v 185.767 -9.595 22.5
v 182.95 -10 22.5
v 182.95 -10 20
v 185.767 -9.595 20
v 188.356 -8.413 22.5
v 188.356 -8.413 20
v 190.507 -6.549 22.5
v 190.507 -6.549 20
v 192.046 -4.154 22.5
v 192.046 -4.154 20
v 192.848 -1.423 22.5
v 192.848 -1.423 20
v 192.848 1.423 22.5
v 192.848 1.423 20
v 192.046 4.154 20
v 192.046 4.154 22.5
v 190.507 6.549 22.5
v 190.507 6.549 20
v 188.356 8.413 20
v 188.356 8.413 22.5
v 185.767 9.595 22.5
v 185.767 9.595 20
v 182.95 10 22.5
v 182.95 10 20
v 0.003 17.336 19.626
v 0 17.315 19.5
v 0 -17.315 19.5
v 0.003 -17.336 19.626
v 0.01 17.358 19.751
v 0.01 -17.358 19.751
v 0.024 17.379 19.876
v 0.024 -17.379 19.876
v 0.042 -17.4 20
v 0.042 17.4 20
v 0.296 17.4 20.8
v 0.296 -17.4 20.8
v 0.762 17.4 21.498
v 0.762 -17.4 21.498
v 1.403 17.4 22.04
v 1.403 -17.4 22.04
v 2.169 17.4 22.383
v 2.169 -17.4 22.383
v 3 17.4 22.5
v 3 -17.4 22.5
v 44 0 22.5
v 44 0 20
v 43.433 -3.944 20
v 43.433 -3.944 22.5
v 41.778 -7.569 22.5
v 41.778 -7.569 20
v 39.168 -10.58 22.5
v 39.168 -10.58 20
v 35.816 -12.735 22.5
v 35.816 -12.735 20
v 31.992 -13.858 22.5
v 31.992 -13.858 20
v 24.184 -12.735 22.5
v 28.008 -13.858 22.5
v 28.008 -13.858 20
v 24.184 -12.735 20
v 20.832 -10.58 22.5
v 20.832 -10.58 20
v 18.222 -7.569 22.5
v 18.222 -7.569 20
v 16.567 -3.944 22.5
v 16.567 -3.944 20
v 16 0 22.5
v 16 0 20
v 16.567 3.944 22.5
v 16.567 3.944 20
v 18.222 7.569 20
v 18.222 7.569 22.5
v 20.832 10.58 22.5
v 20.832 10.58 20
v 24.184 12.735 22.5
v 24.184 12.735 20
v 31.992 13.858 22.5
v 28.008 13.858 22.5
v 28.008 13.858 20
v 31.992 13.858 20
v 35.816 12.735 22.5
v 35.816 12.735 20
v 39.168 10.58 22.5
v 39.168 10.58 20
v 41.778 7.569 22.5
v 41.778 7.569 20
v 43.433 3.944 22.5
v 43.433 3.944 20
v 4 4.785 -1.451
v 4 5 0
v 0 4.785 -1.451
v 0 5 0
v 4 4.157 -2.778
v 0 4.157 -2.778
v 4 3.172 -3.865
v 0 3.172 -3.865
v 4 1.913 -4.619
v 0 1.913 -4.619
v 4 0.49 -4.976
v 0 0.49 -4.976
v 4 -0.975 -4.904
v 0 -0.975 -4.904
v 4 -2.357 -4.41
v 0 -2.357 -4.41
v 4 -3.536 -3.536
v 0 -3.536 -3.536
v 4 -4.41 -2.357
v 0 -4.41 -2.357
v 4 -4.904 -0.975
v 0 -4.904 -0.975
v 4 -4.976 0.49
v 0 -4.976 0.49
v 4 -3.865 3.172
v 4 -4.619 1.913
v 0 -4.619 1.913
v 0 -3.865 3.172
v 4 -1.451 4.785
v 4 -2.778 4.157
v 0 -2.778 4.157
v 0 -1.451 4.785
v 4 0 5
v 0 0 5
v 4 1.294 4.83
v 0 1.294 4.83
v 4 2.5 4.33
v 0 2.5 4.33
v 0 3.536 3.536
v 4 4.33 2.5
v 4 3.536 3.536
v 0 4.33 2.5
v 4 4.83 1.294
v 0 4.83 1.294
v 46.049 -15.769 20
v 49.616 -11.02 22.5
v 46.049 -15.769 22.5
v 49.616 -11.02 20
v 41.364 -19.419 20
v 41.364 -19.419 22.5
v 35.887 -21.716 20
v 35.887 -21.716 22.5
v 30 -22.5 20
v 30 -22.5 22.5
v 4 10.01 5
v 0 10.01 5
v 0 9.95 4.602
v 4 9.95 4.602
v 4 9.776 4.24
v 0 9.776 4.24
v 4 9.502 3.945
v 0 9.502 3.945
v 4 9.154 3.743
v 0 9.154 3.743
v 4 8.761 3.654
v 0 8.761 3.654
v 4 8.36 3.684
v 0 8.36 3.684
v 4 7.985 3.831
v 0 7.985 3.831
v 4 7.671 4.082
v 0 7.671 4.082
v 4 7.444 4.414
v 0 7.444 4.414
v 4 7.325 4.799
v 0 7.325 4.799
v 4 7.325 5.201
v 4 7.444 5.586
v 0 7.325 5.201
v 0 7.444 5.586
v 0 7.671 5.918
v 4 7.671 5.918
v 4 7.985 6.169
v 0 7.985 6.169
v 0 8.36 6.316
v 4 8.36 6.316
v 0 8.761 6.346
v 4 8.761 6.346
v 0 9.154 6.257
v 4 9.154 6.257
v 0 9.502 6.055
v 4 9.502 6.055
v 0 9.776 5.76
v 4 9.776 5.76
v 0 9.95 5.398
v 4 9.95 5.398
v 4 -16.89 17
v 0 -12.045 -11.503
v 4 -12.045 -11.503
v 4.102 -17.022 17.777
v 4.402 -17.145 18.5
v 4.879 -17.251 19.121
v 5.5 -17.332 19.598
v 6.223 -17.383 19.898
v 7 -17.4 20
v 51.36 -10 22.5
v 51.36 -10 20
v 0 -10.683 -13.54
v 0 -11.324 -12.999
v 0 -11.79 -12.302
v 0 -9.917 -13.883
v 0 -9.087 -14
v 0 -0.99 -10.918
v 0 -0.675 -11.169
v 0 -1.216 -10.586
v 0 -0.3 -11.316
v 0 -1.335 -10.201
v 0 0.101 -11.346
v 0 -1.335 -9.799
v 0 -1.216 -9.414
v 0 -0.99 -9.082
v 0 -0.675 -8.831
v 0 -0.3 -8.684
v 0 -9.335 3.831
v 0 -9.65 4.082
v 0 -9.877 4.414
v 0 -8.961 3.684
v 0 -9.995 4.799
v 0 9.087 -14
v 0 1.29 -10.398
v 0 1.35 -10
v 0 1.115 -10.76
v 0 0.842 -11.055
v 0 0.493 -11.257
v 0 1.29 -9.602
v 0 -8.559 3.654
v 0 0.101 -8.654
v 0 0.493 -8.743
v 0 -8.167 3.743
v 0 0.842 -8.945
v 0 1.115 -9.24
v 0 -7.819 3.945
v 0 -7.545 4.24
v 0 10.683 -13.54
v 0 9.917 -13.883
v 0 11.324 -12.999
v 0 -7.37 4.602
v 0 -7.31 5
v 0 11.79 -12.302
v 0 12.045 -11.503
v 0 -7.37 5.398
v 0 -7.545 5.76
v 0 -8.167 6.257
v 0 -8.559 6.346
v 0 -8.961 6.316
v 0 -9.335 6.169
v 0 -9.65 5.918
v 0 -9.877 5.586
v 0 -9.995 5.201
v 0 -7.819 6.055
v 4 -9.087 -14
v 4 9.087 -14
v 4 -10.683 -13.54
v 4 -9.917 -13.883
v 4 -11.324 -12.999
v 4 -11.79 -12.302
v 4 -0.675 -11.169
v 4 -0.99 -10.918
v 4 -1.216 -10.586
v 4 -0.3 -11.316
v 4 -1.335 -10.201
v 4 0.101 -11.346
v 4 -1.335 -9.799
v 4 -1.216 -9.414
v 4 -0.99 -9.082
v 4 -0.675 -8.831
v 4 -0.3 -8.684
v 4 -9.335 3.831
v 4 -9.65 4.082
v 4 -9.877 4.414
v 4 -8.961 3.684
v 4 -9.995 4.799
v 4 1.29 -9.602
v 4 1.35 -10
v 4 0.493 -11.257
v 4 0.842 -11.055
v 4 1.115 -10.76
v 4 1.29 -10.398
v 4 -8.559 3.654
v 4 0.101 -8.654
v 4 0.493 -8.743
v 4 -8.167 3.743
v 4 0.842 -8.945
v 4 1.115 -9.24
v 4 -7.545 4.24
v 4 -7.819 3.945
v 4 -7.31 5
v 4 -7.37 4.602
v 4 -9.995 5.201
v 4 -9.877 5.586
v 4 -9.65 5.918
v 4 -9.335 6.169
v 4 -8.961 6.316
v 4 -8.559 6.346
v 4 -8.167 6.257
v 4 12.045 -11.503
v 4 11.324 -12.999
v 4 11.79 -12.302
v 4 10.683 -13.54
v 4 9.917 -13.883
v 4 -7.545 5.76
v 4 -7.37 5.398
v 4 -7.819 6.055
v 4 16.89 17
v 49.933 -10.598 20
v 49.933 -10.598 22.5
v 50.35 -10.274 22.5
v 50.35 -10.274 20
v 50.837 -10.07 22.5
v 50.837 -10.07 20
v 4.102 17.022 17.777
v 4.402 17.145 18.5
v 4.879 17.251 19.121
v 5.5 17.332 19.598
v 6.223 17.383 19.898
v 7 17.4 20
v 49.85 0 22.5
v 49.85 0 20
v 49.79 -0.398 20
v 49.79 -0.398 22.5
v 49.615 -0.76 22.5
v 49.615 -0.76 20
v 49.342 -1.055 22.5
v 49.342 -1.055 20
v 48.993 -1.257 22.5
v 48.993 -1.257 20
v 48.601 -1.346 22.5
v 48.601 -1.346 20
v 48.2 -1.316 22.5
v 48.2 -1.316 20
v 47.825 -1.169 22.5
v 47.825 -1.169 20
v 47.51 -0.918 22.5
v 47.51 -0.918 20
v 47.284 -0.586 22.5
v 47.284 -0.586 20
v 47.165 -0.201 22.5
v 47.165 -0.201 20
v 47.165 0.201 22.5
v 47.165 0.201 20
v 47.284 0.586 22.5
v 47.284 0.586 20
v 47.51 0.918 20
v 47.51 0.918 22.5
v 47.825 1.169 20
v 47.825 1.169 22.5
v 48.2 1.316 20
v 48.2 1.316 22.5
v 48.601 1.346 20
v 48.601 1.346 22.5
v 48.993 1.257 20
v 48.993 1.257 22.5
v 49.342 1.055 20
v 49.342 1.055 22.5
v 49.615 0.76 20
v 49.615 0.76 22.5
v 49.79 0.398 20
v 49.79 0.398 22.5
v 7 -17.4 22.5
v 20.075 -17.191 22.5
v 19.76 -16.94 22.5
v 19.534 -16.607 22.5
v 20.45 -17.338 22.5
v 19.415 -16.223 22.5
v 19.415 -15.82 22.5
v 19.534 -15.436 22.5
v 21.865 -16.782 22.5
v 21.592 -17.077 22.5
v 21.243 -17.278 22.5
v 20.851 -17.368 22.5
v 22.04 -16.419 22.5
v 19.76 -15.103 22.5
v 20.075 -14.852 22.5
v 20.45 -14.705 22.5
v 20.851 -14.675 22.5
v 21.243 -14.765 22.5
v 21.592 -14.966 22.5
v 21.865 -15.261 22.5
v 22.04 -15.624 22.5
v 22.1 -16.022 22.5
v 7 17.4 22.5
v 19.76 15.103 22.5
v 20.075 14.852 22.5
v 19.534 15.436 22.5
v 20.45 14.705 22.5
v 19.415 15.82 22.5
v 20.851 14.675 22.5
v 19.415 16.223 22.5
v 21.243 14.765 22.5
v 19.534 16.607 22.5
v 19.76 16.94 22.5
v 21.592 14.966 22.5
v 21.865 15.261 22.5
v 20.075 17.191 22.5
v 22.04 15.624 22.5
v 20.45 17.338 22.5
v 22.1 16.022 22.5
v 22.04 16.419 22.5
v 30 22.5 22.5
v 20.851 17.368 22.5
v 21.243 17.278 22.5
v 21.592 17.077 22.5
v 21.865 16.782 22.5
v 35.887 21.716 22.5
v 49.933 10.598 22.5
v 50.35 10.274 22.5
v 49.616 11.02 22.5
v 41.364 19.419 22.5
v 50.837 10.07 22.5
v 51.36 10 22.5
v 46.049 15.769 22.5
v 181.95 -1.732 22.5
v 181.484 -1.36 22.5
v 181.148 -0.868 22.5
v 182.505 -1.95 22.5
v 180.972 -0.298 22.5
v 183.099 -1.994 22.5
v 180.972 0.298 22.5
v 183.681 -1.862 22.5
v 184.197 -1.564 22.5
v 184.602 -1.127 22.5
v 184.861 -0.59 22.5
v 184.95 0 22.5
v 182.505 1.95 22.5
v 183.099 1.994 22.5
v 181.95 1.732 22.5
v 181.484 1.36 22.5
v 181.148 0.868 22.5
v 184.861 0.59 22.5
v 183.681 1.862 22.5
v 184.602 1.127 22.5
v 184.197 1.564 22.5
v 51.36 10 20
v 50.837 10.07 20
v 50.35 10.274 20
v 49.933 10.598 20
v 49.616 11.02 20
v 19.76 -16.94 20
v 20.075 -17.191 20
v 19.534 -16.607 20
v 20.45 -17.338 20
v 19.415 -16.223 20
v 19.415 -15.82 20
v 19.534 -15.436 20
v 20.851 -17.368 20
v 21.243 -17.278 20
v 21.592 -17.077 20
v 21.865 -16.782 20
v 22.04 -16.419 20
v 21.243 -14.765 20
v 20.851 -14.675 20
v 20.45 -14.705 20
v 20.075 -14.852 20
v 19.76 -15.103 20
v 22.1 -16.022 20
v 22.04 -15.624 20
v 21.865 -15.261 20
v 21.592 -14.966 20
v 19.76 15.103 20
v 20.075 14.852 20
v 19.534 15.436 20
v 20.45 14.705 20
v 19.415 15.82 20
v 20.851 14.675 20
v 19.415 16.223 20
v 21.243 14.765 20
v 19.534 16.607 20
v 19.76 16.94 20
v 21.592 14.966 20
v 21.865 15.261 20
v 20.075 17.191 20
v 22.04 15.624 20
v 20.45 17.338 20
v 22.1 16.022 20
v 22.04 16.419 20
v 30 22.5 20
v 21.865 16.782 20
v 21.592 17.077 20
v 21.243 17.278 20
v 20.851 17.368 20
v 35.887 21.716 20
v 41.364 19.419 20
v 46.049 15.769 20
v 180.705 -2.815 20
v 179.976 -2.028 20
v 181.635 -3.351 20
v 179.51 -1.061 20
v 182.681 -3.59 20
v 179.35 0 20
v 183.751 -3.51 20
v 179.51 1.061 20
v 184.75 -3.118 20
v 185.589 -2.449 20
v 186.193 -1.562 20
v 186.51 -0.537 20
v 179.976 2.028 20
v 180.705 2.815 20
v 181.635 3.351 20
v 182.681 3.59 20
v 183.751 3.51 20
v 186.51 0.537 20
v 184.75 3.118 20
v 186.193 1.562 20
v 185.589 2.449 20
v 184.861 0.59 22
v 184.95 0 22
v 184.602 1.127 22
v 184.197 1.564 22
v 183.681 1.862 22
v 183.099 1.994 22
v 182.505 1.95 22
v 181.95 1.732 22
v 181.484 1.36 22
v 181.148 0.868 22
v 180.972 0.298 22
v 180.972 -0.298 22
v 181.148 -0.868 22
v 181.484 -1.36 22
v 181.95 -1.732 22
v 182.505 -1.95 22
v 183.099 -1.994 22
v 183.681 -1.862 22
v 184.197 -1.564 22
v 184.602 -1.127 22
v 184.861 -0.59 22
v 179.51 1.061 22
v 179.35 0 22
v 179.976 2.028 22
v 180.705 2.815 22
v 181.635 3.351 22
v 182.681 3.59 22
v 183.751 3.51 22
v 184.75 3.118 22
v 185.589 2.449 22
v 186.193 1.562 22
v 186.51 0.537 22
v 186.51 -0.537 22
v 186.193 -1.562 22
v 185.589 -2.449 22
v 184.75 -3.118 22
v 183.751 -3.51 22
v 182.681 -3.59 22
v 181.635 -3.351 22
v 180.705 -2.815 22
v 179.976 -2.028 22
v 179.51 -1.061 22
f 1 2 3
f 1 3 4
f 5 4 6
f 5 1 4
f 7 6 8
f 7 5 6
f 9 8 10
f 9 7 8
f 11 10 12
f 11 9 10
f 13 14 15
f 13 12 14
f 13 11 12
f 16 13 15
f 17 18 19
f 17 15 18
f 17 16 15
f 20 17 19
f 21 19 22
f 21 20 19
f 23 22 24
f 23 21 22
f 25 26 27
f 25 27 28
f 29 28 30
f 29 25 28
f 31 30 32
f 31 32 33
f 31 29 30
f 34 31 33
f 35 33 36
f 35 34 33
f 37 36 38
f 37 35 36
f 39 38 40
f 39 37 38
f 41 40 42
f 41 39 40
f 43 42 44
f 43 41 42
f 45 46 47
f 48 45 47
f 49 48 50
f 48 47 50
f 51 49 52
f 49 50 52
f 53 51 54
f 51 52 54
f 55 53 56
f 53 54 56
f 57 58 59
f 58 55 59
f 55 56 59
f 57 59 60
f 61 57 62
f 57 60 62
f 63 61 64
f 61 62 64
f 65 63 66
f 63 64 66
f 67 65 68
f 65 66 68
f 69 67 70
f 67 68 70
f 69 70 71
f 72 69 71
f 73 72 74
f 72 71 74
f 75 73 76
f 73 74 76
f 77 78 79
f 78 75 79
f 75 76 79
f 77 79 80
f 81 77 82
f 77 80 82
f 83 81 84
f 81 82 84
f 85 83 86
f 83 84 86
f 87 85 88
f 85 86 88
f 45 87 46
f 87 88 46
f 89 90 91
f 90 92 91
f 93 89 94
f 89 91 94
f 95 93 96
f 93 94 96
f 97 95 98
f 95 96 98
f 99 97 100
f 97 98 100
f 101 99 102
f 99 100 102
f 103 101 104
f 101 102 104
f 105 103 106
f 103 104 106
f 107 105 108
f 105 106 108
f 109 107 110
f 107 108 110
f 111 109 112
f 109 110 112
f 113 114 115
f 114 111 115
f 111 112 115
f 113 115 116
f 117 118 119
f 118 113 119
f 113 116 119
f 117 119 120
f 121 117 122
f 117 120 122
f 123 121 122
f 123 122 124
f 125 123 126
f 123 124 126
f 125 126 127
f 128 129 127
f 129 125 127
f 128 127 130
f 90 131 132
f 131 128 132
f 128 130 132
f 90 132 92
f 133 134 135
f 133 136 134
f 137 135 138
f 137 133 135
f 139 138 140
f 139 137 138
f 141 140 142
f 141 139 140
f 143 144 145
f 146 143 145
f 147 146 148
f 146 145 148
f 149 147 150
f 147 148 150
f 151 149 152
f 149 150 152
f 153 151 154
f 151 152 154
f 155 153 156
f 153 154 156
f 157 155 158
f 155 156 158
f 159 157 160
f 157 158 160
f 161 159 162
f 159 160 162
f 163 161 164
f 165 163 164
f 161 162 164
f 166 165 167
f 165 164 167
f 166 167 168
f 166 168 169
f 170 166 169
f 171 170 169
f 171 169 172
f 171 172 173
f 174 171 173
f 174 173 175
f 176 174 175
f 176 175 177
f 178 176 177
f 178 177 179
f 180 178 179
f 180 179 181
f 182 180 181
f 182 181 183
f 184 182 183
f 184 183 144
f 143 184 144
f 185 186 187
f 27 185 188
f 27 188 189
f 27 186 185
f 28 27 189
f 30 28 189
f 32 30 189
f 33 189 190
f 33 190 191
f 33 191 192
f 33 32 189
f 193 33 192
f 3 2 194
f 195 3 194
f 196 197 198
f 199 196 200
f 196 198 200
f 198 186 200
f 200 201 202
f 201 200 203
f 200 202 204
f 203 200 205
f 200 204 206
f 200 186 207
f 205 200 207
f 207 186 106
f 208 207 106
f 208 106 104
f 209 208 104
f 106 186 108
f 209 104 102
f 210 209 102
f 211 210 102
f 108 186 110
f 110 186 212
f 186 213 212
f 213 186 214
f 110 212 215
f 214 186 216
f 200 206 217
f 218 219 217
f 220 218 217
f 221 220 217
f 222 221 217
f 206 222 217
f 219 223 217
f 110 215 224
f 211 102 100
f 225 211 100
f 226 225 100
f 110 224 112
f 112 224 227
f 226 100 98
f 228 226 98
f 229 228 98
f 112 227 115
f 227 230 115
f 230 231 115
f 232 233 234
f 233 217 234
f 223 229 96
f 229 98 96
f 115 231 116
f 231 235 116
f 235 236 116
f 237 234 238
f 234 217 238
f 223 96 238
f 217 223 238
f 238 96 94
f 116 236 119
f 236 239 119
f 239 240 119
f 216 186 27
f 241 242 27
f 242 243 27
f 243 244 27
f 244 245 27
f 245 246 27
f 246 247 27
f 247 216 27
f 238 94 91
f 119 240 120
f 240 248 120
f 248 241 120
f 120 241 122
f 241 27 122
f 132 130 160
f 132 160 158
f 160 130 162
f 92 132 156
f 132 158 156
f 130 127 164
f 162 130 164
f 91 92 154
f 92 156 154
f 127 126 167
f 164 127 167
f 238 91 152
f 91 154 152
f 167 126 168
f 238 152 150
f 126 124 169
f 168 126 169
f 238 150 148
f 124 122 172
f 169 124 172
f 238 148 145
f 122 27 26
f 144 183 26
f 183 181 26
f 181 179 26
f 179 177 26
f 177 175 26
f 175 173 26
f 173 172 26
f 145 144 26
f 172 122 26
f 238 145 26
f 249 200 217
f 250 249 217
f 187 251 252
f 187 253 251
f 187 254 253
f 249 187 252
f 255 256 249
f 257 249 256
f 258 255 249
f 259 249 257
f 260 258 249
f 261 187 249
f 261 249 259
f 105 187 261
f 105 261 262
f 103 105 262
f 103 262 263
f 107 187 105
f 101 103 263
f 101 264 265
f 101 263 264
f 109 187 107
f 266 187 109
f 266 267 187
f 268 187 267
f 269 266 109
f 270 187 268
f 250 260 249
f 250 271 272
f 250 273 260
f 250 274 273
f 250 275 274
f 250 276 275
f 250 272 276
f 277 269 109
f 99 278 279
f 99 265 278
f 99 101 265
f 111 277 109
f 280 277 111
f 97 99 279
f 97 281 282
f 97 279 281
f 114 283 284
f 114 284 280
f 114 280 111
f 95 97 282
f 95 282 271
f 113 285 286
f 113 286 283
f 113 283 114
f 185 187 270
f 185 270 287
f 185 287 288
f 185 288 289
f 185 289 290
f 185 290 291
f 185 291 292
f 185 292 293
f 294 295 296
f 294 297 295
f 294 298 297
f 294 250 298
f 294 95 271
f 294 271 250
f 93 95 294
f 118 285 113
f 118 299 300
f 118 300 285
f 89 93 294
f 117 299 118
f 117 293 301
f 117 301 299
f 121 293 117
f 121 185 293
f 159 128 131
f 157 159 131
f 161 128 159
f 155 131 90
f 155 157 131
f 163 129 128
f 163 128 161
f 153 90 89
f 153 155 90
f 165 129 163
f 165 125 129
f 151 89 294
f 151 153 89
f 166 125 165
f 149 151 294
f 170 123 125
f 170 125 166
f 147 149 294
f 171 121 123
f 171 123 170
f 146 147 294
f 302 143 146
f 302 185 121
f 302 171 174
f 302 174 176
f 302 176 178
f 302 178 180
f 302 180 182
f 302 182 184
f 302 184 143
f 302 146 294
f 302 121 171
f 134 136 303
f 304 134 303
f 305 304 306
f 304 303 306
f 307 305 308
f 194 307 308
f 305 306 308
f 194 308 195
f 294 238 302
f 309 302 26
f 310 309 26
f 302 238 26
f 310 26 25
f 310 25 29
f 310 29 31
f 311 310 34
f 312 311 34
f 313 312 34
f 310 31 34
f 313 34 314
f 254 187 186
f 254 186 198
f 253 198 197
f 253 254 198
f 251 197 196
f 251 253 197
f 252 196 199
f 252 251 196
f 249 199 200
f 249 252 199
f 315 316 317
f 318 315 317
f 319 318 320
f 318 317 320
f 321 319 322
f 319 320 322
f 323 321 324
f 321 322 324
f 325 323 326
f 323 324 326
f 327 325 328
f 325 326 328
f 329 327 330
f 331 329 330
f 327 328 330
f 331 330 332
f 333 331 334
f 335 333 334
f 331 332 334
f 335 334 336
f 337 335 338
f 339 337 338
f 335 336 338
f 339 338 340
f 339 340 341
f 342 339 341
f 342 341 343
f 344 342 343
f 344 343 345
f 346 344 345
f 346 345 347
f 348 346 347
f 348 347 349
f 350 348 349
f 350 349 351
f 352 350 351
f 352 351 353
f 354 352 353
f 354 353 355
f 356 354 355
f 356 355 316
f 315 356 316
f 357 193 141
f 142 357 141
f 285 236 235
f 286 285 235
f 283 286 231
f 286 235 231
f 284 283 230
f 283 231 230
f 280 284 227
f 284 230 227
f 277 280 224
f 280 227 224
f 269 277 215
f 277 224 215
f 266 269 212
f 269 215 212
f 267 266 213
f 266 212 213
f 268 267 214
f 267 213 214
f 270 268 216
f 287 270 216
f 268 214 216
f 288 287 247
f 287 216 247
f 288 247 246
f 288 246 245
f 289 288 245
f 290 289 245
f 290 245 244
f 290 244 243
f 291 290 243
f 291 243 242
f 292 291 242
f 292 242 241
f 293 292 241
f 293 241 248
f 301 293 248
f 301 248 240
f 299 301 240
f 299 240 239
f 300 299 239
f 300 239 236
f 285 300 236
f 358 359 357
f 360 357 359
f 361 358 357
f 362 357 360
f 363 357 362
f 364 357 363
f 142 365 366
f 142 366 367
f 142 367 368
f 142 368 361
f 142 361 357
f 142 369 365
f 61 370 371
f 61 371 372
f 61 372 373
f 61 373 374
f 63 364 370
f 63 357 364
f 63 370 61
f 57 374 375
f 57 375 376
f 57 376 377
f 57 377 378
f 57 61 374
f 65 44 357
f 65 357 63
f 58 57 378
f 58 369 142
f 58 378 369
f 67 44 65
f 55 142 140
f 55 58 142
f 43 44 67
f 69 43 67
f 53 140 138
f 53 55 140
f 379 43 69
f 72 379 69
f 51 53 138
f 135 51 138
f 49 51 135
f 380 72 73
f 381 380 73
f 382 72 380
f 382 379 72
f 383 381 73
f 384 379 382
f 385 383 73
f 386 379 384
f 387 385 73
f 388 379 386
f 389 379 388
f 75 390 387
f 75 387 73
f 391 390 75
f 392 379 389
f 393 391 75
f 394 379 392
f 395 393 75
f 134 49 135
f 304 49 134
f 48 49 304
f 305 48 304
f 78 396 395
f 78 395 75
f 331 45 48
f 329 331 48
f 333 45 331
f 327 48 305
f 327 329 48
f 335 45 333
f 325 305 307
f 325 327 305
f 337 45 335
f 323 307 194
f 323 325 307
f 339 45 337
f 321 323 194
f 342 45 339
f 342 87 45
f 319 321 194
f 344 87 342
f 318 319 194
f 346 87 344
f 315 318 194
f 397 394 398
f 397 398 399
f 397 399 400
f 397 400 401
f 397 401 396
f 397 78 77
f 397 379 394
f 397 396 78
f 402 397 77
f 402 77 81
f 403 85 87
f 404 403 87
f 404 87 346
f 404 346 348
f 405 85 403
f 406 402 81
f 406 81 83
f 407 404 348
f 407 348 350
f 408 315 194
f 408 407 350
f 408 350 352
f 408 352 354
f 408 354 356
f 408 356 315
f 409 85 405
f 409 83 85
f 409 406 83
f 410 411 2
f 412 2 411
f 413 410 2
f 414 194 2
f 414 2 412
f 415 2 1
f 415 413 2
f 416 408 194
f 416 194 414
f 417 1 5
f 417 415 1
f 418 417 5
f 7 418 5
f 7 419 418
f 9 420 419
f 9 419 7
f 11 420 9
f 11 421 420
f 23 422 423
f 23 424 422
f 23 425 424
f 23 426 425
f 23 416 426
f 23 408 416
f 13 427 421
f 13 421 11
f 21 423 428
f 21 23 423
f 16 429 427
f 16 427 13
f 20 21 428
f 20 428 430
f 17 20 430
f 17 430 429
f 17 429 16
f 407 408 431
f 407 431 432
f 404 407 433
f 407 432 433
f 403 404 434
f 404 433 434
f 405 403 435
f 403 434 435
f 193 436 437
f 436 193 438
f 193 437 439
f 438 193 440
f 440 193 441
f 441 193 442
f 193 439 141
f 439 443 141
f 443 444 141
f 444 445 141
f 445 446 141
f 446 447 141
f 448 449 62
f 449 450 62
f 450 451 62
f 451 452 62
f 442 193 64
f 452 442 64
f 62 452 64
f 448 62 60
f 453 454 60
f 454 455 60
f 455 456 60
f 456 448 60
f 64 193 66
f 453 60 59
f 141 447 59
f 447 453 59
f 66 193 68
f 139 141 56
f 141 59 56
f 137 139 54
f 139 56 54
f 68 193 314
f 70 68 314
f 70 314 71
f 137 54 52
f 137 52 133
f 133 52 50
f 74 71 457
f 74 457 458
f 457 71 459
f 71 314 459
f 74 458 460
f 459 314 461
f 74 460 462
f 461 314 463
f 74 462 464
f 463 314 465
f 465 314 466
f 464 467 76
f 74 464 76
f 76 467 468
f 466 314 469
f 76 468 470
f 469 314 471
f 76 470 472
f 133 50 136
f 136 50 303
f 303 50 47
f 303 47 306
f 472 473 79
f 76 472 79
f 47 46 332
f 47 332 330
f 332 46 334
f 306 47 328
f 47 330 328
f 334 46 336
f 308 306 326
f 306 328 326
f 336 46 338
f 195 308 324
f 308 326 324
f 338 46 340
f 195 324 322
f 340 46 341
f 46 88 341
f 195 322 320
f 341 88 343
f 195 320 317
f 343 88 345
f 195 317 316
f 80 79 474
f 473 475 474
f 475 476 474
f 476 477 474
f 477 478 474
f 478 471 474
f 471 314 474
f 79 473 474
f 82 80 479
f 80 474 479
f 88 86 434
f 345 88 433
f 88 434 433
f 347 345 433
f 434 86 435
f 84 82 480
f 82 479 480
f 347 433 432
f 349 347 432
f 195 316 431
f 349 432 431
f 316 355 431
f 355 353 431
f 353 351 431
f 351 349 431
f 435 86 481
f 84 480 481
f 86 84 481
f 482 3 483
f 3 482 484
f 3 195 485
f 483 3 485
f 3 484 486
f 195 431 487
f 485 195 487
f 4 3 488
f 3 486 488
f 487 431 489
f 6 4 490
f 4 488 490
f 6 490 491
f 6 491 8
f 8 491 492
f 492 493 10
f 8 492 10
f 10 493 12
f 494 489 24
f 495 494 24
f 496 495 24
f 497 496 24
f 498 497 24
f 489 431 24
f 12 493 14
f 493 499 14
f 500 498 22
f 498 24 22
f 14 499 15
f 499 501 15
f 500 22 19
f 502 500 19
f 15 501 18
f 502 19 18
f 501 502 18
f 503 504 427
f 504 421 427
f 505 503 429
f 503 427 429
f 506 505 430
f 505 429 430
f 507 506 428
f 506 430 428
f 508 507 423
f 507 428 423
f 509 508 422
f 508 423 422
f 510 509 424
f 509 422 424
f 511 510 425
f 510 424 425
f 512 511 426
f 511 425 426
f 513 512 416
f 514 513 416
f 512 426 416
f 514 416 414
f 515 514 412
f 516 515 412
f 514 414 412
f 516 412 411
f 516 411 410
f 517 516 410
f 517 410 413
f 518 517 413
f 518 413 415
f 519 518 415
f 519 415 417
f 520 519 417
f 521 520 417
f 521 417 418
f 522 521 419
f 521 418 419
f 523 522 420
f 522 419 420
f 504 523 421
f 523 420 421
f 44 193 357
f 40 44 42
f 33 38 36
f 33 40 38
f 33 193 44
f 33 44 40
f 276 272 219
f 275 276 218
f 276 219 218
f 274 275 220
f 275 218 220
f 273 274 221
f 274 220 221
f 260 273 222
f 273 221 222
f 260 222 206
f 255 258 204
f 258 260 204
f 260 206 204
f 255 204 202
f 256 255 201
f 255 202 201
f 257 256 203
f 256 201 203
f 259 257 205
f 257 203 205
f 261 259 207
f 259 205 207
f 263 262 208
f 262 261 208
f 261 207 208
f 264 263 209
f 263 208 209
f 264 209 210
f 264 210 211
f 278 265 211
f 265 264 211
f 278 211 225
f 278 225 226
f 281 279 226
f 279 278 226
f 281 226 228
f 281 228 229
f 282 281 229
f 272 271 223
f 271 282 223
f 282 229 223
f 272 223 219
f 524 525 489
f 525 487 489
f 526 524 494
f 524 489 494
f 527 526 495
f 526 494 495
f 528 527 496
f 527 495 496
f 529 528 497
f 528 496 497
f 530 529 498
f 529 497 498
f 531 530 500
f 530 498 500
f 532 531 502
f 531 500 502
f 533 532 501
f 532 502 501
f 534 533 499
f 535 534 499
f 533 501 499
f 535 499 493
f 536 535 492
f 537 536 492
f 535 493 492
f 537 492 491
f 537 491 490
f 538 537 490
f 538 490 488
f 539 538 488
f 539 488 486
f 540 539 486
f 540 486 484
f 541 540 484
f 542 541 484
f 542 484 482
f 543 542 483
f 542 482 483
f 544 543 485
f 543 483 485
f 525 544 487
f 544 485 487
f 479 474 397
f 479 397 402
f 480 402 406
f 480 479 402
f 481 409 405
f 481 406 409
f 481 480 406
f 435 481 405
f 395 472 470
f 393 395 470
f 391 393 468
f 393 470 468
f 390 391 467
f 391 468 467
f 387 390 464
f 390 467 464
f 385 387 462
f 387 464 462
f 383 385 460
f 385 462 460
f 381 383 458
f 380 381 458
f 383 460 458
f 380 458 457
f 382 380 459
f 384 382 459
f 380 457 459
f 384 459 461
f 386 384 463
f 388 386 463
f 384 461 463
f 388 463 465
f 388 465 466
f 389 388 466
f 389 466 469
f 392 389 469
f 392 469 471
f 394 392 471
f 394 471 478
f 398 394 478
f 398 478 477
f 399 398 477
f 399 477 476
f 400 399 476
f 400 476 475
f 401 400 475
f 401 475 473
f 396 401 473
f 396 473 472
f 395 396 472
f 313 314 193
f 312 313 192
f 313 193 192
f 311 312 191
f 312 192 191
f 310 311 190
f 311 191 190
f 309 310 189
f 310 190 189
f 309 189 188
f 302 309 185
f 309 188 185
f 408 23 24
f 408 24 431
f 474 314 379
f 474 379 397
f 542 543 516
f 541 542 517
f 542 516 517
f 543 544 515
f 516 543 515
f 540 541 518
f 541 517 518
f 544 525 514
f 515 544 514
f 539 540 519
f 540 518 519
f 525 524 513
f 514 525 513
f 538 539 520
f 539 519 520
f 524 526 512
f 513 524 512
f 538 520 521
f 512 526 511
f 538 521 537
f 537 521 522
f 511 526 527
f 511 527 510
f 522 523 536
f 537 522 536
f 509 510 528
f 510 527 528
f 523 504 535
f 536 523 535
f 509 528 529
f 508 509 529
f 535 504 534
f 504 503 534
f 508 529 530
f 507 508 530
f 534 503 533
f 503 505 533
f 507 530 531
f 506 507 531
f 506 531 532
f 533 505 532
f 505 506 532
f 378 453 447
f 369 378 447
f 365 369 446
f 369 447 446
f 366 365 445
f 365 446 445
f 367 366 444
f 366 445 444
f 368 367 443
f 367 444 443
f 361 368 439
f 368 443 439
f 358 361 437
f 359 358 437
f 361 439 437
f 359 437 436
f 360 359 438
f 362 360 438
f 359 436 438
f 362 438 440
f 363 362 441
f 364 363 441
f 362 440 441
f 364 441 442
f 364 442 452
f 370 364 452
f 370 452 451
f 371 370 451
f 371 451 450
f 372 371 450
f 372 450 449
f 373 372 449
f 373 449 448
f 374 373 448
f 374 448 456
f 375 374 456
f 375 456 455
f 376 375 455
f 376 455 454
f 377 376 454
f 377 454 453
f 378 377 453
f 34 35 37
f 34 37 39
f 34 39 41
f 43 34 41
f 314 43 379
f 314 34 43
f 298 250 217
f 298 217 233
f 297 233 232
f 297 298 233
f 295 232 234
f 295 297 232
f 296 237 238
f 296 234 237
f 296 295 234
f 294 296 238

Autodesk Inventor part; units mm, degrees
ref_plane "YZ Plane" through (0, 0, 0) normal (1, 0, 0) x (0, 1, 0)
ref_plane "XZ Plane" through (0, 0, 0) normal (0, 1, 0) x (-1, 0, 0)
ref_plane "XY Plane" through (0, 0, 0) normal (0, 0, 1) x (1, 0, 0)
sketch "スケッチ1" plane through (0, 0, 0) normal (1, 0, 0) x (0, 1, 0)
  circle A0 centre (0, 0) radius 10
  circle A1 centre (0, -10) radius 1.35
  circle A2 centre (8.6603, 5) radius 1.35
  circle A3 centre (-8.6603, 5) radius 1.35
  circle A4 centre (0, 0) radius 5
  line L0 (0, 0) -> (0, 50)
  circle A5 centre (0, 50) radius 22.5
  circle A6 centre (0, 0) radius 14
  line L1 (-14, 0) -> (-22.5, 50)
  line L2 (14, 0) -> (22.5, 50)
  line L3 (0, -14) -> (-11.62, -14)
  line L4 (-11.62, -14) -> (-14, 0)
  line L5 (0, -14) -> (11.62, -14)
  line L6 (11.62, -14) -> (14, 0)
  line L7 (0, 20) -> (-17.4, 20)
  line L8 (0, 20) -> (17.4, 20)
  dimension "d0" = 20
  dimension "d1" = 2.7
  dimension "d4" = 360
  dimension "d6" = 10
  dimension "d7" = 50
  dimension "d8" = 45
  dimension "d9" = 28
extrude "押し出し1" add sketch "スケッチ1" along normal blind 4 contours A0 A1 A3 A2 | A6 L6 L4 | A6 L1 L7 L0 | L0 L8 L2 A6 | L6 L5 A6 | A6 L3 L4
sketch "スケッチ2" plane through (0, -17.4, 20) normal (0, 0, 1) x (1, 0, 0)
  line L0 (0, 17.4) -> (30, 17.4)
  circle A0 centre (30, 17.4) radius 22.5
  circle A1 centre (30, 17.4) radius 18.5
  circle A2 centre (30, 17.4) radius 14
  circle A3 centre (48.5, 17.4) radius 1.35
  circle A4 centre (20.75, 33.4215) radius 1.35
  circle A5 centre (20.75, 1.3785) radius 1.35
  line L1 (0, 29.02) -> (0, 34.8) projected
  line L2 (0, 0) -> (0, 5.78) projected
  line L3 (0, 34.8) -> (0, 0)
  line L4 (4, 29.02) -> (4, 34.8) projected
  line L5 (4, 34.8) -> (7, 34.8)
  line L6 (7, 34.8) -> (30, 39.9)
  line L7 (4, 0) -> (4, 5.78) projected
  line L8 (4, 0) -> (7, 0)
  line L9 (7, 0) -> (30, -5.1)
  line L10 (4, 0) -> (0, 0)
  line L11 (0, 34.8) -> (4, 34.8) projected
  line L12 (0, 0) -> (0, 34.8)
  line L13 (0, 34.8) -> (4, 34.8)
  dimension "d14" = 37
  dimension "d12" = 30
  dimension "d13" = 45
  dimension "d15" = 28
  dimension "d16" = 2.7
  dimension "d19" = 360
  dimension "d21" = 3
  dimension "d22" = 3
extrude "押し出し2" add sketch "スケッチ2" along normal blind 2.5 contours L3 L1 L11 L5 L6 A0 L0 | L0 A0 L9 L8 L10 L2 L3 | A1 A4 A3 A5 | A0 L6 L9
fillet "フィレット1" radius 3 2 edges at (4, 0, 20) (0, 0, 22.5)
fillet "フィレット2" radius 3 2 edges at (2, -11.62, -14) (2, 11.62, -14)
sketch "スケッチ7" plane through (0, -17.4, 22.5) normal (0, 0, 1) x (1, 0, 0)
  circle A0 centre (30, 17.4) radius 14 projected
  line L0 (30, 17.4) -> (182.95, 17.4)
  line L1 (30, 17.4) -> (182.95, 17.4) construction
  circle A1 centre (182.95, 17.4) radius 3.5
  circle A2 centre (182.95, 17.4) radius 10
  line L2 (182.95, 27.4) -> (50.1556, 27.4)
  arc A3 (30, -5.1) -> (30, 39.9) centre (30, 17.4) ccw projected
  line L3 (182.95, 27.4) -> (315.7444, 27.4) construction
  line L4 (182.95, 7.4) -> (50.1556, 7.4)
  point P0 (0, 17.4)
  dimension "d55" = 152.95
  dimension "d56" = 0
  dimension "d57" = 7
  dimension "d58" = 20
  dimension "d59" = 180
extrude "押し出し7" add sketch "スケッチ7" against normal blind 2.5 contours A3 L2 A2 L0 | L0 A2 L4 A3 | A2
fillet "フィレット3" radius 2 2 edges at (50.1556, 10, 21.25) (50.1556, -10, 21.25)
sketch "スケッチ9" plane through (0, -17.4, 22.5) normal (0, 0, 1) x (1, 0, 0)
  circle A0 centre (182.95, 17.4) radius 3.5 projected
  circle A1 centre (182.95, 17.4) radius 3.5
  circle A2 centre (182.95, 17.4) radius 2
  point P0 (0, 17.4)
  dimension "d68" = 4
extrude "押し出し9" add sketch "スケッチ9" against normal blind 0.5
sketch "スケッチ10" plane through (0, -17.4, 20) normal (0, 0, -1) x (-1, 0, 0)
  circle A0 centre (-182.95, 17.4) radius 3.5 projected
  circle A1 centre (-182.95, 17.4) radius 3.6
  point P0 (0, 17.4)
  dimension "d71" = 7.2
extrude "押し出し10" cut sketch "スケッチ10" against normal blind 2 contours A0 | A1
properties part number "motor_holder_2" material "アルミニウム 6061"
